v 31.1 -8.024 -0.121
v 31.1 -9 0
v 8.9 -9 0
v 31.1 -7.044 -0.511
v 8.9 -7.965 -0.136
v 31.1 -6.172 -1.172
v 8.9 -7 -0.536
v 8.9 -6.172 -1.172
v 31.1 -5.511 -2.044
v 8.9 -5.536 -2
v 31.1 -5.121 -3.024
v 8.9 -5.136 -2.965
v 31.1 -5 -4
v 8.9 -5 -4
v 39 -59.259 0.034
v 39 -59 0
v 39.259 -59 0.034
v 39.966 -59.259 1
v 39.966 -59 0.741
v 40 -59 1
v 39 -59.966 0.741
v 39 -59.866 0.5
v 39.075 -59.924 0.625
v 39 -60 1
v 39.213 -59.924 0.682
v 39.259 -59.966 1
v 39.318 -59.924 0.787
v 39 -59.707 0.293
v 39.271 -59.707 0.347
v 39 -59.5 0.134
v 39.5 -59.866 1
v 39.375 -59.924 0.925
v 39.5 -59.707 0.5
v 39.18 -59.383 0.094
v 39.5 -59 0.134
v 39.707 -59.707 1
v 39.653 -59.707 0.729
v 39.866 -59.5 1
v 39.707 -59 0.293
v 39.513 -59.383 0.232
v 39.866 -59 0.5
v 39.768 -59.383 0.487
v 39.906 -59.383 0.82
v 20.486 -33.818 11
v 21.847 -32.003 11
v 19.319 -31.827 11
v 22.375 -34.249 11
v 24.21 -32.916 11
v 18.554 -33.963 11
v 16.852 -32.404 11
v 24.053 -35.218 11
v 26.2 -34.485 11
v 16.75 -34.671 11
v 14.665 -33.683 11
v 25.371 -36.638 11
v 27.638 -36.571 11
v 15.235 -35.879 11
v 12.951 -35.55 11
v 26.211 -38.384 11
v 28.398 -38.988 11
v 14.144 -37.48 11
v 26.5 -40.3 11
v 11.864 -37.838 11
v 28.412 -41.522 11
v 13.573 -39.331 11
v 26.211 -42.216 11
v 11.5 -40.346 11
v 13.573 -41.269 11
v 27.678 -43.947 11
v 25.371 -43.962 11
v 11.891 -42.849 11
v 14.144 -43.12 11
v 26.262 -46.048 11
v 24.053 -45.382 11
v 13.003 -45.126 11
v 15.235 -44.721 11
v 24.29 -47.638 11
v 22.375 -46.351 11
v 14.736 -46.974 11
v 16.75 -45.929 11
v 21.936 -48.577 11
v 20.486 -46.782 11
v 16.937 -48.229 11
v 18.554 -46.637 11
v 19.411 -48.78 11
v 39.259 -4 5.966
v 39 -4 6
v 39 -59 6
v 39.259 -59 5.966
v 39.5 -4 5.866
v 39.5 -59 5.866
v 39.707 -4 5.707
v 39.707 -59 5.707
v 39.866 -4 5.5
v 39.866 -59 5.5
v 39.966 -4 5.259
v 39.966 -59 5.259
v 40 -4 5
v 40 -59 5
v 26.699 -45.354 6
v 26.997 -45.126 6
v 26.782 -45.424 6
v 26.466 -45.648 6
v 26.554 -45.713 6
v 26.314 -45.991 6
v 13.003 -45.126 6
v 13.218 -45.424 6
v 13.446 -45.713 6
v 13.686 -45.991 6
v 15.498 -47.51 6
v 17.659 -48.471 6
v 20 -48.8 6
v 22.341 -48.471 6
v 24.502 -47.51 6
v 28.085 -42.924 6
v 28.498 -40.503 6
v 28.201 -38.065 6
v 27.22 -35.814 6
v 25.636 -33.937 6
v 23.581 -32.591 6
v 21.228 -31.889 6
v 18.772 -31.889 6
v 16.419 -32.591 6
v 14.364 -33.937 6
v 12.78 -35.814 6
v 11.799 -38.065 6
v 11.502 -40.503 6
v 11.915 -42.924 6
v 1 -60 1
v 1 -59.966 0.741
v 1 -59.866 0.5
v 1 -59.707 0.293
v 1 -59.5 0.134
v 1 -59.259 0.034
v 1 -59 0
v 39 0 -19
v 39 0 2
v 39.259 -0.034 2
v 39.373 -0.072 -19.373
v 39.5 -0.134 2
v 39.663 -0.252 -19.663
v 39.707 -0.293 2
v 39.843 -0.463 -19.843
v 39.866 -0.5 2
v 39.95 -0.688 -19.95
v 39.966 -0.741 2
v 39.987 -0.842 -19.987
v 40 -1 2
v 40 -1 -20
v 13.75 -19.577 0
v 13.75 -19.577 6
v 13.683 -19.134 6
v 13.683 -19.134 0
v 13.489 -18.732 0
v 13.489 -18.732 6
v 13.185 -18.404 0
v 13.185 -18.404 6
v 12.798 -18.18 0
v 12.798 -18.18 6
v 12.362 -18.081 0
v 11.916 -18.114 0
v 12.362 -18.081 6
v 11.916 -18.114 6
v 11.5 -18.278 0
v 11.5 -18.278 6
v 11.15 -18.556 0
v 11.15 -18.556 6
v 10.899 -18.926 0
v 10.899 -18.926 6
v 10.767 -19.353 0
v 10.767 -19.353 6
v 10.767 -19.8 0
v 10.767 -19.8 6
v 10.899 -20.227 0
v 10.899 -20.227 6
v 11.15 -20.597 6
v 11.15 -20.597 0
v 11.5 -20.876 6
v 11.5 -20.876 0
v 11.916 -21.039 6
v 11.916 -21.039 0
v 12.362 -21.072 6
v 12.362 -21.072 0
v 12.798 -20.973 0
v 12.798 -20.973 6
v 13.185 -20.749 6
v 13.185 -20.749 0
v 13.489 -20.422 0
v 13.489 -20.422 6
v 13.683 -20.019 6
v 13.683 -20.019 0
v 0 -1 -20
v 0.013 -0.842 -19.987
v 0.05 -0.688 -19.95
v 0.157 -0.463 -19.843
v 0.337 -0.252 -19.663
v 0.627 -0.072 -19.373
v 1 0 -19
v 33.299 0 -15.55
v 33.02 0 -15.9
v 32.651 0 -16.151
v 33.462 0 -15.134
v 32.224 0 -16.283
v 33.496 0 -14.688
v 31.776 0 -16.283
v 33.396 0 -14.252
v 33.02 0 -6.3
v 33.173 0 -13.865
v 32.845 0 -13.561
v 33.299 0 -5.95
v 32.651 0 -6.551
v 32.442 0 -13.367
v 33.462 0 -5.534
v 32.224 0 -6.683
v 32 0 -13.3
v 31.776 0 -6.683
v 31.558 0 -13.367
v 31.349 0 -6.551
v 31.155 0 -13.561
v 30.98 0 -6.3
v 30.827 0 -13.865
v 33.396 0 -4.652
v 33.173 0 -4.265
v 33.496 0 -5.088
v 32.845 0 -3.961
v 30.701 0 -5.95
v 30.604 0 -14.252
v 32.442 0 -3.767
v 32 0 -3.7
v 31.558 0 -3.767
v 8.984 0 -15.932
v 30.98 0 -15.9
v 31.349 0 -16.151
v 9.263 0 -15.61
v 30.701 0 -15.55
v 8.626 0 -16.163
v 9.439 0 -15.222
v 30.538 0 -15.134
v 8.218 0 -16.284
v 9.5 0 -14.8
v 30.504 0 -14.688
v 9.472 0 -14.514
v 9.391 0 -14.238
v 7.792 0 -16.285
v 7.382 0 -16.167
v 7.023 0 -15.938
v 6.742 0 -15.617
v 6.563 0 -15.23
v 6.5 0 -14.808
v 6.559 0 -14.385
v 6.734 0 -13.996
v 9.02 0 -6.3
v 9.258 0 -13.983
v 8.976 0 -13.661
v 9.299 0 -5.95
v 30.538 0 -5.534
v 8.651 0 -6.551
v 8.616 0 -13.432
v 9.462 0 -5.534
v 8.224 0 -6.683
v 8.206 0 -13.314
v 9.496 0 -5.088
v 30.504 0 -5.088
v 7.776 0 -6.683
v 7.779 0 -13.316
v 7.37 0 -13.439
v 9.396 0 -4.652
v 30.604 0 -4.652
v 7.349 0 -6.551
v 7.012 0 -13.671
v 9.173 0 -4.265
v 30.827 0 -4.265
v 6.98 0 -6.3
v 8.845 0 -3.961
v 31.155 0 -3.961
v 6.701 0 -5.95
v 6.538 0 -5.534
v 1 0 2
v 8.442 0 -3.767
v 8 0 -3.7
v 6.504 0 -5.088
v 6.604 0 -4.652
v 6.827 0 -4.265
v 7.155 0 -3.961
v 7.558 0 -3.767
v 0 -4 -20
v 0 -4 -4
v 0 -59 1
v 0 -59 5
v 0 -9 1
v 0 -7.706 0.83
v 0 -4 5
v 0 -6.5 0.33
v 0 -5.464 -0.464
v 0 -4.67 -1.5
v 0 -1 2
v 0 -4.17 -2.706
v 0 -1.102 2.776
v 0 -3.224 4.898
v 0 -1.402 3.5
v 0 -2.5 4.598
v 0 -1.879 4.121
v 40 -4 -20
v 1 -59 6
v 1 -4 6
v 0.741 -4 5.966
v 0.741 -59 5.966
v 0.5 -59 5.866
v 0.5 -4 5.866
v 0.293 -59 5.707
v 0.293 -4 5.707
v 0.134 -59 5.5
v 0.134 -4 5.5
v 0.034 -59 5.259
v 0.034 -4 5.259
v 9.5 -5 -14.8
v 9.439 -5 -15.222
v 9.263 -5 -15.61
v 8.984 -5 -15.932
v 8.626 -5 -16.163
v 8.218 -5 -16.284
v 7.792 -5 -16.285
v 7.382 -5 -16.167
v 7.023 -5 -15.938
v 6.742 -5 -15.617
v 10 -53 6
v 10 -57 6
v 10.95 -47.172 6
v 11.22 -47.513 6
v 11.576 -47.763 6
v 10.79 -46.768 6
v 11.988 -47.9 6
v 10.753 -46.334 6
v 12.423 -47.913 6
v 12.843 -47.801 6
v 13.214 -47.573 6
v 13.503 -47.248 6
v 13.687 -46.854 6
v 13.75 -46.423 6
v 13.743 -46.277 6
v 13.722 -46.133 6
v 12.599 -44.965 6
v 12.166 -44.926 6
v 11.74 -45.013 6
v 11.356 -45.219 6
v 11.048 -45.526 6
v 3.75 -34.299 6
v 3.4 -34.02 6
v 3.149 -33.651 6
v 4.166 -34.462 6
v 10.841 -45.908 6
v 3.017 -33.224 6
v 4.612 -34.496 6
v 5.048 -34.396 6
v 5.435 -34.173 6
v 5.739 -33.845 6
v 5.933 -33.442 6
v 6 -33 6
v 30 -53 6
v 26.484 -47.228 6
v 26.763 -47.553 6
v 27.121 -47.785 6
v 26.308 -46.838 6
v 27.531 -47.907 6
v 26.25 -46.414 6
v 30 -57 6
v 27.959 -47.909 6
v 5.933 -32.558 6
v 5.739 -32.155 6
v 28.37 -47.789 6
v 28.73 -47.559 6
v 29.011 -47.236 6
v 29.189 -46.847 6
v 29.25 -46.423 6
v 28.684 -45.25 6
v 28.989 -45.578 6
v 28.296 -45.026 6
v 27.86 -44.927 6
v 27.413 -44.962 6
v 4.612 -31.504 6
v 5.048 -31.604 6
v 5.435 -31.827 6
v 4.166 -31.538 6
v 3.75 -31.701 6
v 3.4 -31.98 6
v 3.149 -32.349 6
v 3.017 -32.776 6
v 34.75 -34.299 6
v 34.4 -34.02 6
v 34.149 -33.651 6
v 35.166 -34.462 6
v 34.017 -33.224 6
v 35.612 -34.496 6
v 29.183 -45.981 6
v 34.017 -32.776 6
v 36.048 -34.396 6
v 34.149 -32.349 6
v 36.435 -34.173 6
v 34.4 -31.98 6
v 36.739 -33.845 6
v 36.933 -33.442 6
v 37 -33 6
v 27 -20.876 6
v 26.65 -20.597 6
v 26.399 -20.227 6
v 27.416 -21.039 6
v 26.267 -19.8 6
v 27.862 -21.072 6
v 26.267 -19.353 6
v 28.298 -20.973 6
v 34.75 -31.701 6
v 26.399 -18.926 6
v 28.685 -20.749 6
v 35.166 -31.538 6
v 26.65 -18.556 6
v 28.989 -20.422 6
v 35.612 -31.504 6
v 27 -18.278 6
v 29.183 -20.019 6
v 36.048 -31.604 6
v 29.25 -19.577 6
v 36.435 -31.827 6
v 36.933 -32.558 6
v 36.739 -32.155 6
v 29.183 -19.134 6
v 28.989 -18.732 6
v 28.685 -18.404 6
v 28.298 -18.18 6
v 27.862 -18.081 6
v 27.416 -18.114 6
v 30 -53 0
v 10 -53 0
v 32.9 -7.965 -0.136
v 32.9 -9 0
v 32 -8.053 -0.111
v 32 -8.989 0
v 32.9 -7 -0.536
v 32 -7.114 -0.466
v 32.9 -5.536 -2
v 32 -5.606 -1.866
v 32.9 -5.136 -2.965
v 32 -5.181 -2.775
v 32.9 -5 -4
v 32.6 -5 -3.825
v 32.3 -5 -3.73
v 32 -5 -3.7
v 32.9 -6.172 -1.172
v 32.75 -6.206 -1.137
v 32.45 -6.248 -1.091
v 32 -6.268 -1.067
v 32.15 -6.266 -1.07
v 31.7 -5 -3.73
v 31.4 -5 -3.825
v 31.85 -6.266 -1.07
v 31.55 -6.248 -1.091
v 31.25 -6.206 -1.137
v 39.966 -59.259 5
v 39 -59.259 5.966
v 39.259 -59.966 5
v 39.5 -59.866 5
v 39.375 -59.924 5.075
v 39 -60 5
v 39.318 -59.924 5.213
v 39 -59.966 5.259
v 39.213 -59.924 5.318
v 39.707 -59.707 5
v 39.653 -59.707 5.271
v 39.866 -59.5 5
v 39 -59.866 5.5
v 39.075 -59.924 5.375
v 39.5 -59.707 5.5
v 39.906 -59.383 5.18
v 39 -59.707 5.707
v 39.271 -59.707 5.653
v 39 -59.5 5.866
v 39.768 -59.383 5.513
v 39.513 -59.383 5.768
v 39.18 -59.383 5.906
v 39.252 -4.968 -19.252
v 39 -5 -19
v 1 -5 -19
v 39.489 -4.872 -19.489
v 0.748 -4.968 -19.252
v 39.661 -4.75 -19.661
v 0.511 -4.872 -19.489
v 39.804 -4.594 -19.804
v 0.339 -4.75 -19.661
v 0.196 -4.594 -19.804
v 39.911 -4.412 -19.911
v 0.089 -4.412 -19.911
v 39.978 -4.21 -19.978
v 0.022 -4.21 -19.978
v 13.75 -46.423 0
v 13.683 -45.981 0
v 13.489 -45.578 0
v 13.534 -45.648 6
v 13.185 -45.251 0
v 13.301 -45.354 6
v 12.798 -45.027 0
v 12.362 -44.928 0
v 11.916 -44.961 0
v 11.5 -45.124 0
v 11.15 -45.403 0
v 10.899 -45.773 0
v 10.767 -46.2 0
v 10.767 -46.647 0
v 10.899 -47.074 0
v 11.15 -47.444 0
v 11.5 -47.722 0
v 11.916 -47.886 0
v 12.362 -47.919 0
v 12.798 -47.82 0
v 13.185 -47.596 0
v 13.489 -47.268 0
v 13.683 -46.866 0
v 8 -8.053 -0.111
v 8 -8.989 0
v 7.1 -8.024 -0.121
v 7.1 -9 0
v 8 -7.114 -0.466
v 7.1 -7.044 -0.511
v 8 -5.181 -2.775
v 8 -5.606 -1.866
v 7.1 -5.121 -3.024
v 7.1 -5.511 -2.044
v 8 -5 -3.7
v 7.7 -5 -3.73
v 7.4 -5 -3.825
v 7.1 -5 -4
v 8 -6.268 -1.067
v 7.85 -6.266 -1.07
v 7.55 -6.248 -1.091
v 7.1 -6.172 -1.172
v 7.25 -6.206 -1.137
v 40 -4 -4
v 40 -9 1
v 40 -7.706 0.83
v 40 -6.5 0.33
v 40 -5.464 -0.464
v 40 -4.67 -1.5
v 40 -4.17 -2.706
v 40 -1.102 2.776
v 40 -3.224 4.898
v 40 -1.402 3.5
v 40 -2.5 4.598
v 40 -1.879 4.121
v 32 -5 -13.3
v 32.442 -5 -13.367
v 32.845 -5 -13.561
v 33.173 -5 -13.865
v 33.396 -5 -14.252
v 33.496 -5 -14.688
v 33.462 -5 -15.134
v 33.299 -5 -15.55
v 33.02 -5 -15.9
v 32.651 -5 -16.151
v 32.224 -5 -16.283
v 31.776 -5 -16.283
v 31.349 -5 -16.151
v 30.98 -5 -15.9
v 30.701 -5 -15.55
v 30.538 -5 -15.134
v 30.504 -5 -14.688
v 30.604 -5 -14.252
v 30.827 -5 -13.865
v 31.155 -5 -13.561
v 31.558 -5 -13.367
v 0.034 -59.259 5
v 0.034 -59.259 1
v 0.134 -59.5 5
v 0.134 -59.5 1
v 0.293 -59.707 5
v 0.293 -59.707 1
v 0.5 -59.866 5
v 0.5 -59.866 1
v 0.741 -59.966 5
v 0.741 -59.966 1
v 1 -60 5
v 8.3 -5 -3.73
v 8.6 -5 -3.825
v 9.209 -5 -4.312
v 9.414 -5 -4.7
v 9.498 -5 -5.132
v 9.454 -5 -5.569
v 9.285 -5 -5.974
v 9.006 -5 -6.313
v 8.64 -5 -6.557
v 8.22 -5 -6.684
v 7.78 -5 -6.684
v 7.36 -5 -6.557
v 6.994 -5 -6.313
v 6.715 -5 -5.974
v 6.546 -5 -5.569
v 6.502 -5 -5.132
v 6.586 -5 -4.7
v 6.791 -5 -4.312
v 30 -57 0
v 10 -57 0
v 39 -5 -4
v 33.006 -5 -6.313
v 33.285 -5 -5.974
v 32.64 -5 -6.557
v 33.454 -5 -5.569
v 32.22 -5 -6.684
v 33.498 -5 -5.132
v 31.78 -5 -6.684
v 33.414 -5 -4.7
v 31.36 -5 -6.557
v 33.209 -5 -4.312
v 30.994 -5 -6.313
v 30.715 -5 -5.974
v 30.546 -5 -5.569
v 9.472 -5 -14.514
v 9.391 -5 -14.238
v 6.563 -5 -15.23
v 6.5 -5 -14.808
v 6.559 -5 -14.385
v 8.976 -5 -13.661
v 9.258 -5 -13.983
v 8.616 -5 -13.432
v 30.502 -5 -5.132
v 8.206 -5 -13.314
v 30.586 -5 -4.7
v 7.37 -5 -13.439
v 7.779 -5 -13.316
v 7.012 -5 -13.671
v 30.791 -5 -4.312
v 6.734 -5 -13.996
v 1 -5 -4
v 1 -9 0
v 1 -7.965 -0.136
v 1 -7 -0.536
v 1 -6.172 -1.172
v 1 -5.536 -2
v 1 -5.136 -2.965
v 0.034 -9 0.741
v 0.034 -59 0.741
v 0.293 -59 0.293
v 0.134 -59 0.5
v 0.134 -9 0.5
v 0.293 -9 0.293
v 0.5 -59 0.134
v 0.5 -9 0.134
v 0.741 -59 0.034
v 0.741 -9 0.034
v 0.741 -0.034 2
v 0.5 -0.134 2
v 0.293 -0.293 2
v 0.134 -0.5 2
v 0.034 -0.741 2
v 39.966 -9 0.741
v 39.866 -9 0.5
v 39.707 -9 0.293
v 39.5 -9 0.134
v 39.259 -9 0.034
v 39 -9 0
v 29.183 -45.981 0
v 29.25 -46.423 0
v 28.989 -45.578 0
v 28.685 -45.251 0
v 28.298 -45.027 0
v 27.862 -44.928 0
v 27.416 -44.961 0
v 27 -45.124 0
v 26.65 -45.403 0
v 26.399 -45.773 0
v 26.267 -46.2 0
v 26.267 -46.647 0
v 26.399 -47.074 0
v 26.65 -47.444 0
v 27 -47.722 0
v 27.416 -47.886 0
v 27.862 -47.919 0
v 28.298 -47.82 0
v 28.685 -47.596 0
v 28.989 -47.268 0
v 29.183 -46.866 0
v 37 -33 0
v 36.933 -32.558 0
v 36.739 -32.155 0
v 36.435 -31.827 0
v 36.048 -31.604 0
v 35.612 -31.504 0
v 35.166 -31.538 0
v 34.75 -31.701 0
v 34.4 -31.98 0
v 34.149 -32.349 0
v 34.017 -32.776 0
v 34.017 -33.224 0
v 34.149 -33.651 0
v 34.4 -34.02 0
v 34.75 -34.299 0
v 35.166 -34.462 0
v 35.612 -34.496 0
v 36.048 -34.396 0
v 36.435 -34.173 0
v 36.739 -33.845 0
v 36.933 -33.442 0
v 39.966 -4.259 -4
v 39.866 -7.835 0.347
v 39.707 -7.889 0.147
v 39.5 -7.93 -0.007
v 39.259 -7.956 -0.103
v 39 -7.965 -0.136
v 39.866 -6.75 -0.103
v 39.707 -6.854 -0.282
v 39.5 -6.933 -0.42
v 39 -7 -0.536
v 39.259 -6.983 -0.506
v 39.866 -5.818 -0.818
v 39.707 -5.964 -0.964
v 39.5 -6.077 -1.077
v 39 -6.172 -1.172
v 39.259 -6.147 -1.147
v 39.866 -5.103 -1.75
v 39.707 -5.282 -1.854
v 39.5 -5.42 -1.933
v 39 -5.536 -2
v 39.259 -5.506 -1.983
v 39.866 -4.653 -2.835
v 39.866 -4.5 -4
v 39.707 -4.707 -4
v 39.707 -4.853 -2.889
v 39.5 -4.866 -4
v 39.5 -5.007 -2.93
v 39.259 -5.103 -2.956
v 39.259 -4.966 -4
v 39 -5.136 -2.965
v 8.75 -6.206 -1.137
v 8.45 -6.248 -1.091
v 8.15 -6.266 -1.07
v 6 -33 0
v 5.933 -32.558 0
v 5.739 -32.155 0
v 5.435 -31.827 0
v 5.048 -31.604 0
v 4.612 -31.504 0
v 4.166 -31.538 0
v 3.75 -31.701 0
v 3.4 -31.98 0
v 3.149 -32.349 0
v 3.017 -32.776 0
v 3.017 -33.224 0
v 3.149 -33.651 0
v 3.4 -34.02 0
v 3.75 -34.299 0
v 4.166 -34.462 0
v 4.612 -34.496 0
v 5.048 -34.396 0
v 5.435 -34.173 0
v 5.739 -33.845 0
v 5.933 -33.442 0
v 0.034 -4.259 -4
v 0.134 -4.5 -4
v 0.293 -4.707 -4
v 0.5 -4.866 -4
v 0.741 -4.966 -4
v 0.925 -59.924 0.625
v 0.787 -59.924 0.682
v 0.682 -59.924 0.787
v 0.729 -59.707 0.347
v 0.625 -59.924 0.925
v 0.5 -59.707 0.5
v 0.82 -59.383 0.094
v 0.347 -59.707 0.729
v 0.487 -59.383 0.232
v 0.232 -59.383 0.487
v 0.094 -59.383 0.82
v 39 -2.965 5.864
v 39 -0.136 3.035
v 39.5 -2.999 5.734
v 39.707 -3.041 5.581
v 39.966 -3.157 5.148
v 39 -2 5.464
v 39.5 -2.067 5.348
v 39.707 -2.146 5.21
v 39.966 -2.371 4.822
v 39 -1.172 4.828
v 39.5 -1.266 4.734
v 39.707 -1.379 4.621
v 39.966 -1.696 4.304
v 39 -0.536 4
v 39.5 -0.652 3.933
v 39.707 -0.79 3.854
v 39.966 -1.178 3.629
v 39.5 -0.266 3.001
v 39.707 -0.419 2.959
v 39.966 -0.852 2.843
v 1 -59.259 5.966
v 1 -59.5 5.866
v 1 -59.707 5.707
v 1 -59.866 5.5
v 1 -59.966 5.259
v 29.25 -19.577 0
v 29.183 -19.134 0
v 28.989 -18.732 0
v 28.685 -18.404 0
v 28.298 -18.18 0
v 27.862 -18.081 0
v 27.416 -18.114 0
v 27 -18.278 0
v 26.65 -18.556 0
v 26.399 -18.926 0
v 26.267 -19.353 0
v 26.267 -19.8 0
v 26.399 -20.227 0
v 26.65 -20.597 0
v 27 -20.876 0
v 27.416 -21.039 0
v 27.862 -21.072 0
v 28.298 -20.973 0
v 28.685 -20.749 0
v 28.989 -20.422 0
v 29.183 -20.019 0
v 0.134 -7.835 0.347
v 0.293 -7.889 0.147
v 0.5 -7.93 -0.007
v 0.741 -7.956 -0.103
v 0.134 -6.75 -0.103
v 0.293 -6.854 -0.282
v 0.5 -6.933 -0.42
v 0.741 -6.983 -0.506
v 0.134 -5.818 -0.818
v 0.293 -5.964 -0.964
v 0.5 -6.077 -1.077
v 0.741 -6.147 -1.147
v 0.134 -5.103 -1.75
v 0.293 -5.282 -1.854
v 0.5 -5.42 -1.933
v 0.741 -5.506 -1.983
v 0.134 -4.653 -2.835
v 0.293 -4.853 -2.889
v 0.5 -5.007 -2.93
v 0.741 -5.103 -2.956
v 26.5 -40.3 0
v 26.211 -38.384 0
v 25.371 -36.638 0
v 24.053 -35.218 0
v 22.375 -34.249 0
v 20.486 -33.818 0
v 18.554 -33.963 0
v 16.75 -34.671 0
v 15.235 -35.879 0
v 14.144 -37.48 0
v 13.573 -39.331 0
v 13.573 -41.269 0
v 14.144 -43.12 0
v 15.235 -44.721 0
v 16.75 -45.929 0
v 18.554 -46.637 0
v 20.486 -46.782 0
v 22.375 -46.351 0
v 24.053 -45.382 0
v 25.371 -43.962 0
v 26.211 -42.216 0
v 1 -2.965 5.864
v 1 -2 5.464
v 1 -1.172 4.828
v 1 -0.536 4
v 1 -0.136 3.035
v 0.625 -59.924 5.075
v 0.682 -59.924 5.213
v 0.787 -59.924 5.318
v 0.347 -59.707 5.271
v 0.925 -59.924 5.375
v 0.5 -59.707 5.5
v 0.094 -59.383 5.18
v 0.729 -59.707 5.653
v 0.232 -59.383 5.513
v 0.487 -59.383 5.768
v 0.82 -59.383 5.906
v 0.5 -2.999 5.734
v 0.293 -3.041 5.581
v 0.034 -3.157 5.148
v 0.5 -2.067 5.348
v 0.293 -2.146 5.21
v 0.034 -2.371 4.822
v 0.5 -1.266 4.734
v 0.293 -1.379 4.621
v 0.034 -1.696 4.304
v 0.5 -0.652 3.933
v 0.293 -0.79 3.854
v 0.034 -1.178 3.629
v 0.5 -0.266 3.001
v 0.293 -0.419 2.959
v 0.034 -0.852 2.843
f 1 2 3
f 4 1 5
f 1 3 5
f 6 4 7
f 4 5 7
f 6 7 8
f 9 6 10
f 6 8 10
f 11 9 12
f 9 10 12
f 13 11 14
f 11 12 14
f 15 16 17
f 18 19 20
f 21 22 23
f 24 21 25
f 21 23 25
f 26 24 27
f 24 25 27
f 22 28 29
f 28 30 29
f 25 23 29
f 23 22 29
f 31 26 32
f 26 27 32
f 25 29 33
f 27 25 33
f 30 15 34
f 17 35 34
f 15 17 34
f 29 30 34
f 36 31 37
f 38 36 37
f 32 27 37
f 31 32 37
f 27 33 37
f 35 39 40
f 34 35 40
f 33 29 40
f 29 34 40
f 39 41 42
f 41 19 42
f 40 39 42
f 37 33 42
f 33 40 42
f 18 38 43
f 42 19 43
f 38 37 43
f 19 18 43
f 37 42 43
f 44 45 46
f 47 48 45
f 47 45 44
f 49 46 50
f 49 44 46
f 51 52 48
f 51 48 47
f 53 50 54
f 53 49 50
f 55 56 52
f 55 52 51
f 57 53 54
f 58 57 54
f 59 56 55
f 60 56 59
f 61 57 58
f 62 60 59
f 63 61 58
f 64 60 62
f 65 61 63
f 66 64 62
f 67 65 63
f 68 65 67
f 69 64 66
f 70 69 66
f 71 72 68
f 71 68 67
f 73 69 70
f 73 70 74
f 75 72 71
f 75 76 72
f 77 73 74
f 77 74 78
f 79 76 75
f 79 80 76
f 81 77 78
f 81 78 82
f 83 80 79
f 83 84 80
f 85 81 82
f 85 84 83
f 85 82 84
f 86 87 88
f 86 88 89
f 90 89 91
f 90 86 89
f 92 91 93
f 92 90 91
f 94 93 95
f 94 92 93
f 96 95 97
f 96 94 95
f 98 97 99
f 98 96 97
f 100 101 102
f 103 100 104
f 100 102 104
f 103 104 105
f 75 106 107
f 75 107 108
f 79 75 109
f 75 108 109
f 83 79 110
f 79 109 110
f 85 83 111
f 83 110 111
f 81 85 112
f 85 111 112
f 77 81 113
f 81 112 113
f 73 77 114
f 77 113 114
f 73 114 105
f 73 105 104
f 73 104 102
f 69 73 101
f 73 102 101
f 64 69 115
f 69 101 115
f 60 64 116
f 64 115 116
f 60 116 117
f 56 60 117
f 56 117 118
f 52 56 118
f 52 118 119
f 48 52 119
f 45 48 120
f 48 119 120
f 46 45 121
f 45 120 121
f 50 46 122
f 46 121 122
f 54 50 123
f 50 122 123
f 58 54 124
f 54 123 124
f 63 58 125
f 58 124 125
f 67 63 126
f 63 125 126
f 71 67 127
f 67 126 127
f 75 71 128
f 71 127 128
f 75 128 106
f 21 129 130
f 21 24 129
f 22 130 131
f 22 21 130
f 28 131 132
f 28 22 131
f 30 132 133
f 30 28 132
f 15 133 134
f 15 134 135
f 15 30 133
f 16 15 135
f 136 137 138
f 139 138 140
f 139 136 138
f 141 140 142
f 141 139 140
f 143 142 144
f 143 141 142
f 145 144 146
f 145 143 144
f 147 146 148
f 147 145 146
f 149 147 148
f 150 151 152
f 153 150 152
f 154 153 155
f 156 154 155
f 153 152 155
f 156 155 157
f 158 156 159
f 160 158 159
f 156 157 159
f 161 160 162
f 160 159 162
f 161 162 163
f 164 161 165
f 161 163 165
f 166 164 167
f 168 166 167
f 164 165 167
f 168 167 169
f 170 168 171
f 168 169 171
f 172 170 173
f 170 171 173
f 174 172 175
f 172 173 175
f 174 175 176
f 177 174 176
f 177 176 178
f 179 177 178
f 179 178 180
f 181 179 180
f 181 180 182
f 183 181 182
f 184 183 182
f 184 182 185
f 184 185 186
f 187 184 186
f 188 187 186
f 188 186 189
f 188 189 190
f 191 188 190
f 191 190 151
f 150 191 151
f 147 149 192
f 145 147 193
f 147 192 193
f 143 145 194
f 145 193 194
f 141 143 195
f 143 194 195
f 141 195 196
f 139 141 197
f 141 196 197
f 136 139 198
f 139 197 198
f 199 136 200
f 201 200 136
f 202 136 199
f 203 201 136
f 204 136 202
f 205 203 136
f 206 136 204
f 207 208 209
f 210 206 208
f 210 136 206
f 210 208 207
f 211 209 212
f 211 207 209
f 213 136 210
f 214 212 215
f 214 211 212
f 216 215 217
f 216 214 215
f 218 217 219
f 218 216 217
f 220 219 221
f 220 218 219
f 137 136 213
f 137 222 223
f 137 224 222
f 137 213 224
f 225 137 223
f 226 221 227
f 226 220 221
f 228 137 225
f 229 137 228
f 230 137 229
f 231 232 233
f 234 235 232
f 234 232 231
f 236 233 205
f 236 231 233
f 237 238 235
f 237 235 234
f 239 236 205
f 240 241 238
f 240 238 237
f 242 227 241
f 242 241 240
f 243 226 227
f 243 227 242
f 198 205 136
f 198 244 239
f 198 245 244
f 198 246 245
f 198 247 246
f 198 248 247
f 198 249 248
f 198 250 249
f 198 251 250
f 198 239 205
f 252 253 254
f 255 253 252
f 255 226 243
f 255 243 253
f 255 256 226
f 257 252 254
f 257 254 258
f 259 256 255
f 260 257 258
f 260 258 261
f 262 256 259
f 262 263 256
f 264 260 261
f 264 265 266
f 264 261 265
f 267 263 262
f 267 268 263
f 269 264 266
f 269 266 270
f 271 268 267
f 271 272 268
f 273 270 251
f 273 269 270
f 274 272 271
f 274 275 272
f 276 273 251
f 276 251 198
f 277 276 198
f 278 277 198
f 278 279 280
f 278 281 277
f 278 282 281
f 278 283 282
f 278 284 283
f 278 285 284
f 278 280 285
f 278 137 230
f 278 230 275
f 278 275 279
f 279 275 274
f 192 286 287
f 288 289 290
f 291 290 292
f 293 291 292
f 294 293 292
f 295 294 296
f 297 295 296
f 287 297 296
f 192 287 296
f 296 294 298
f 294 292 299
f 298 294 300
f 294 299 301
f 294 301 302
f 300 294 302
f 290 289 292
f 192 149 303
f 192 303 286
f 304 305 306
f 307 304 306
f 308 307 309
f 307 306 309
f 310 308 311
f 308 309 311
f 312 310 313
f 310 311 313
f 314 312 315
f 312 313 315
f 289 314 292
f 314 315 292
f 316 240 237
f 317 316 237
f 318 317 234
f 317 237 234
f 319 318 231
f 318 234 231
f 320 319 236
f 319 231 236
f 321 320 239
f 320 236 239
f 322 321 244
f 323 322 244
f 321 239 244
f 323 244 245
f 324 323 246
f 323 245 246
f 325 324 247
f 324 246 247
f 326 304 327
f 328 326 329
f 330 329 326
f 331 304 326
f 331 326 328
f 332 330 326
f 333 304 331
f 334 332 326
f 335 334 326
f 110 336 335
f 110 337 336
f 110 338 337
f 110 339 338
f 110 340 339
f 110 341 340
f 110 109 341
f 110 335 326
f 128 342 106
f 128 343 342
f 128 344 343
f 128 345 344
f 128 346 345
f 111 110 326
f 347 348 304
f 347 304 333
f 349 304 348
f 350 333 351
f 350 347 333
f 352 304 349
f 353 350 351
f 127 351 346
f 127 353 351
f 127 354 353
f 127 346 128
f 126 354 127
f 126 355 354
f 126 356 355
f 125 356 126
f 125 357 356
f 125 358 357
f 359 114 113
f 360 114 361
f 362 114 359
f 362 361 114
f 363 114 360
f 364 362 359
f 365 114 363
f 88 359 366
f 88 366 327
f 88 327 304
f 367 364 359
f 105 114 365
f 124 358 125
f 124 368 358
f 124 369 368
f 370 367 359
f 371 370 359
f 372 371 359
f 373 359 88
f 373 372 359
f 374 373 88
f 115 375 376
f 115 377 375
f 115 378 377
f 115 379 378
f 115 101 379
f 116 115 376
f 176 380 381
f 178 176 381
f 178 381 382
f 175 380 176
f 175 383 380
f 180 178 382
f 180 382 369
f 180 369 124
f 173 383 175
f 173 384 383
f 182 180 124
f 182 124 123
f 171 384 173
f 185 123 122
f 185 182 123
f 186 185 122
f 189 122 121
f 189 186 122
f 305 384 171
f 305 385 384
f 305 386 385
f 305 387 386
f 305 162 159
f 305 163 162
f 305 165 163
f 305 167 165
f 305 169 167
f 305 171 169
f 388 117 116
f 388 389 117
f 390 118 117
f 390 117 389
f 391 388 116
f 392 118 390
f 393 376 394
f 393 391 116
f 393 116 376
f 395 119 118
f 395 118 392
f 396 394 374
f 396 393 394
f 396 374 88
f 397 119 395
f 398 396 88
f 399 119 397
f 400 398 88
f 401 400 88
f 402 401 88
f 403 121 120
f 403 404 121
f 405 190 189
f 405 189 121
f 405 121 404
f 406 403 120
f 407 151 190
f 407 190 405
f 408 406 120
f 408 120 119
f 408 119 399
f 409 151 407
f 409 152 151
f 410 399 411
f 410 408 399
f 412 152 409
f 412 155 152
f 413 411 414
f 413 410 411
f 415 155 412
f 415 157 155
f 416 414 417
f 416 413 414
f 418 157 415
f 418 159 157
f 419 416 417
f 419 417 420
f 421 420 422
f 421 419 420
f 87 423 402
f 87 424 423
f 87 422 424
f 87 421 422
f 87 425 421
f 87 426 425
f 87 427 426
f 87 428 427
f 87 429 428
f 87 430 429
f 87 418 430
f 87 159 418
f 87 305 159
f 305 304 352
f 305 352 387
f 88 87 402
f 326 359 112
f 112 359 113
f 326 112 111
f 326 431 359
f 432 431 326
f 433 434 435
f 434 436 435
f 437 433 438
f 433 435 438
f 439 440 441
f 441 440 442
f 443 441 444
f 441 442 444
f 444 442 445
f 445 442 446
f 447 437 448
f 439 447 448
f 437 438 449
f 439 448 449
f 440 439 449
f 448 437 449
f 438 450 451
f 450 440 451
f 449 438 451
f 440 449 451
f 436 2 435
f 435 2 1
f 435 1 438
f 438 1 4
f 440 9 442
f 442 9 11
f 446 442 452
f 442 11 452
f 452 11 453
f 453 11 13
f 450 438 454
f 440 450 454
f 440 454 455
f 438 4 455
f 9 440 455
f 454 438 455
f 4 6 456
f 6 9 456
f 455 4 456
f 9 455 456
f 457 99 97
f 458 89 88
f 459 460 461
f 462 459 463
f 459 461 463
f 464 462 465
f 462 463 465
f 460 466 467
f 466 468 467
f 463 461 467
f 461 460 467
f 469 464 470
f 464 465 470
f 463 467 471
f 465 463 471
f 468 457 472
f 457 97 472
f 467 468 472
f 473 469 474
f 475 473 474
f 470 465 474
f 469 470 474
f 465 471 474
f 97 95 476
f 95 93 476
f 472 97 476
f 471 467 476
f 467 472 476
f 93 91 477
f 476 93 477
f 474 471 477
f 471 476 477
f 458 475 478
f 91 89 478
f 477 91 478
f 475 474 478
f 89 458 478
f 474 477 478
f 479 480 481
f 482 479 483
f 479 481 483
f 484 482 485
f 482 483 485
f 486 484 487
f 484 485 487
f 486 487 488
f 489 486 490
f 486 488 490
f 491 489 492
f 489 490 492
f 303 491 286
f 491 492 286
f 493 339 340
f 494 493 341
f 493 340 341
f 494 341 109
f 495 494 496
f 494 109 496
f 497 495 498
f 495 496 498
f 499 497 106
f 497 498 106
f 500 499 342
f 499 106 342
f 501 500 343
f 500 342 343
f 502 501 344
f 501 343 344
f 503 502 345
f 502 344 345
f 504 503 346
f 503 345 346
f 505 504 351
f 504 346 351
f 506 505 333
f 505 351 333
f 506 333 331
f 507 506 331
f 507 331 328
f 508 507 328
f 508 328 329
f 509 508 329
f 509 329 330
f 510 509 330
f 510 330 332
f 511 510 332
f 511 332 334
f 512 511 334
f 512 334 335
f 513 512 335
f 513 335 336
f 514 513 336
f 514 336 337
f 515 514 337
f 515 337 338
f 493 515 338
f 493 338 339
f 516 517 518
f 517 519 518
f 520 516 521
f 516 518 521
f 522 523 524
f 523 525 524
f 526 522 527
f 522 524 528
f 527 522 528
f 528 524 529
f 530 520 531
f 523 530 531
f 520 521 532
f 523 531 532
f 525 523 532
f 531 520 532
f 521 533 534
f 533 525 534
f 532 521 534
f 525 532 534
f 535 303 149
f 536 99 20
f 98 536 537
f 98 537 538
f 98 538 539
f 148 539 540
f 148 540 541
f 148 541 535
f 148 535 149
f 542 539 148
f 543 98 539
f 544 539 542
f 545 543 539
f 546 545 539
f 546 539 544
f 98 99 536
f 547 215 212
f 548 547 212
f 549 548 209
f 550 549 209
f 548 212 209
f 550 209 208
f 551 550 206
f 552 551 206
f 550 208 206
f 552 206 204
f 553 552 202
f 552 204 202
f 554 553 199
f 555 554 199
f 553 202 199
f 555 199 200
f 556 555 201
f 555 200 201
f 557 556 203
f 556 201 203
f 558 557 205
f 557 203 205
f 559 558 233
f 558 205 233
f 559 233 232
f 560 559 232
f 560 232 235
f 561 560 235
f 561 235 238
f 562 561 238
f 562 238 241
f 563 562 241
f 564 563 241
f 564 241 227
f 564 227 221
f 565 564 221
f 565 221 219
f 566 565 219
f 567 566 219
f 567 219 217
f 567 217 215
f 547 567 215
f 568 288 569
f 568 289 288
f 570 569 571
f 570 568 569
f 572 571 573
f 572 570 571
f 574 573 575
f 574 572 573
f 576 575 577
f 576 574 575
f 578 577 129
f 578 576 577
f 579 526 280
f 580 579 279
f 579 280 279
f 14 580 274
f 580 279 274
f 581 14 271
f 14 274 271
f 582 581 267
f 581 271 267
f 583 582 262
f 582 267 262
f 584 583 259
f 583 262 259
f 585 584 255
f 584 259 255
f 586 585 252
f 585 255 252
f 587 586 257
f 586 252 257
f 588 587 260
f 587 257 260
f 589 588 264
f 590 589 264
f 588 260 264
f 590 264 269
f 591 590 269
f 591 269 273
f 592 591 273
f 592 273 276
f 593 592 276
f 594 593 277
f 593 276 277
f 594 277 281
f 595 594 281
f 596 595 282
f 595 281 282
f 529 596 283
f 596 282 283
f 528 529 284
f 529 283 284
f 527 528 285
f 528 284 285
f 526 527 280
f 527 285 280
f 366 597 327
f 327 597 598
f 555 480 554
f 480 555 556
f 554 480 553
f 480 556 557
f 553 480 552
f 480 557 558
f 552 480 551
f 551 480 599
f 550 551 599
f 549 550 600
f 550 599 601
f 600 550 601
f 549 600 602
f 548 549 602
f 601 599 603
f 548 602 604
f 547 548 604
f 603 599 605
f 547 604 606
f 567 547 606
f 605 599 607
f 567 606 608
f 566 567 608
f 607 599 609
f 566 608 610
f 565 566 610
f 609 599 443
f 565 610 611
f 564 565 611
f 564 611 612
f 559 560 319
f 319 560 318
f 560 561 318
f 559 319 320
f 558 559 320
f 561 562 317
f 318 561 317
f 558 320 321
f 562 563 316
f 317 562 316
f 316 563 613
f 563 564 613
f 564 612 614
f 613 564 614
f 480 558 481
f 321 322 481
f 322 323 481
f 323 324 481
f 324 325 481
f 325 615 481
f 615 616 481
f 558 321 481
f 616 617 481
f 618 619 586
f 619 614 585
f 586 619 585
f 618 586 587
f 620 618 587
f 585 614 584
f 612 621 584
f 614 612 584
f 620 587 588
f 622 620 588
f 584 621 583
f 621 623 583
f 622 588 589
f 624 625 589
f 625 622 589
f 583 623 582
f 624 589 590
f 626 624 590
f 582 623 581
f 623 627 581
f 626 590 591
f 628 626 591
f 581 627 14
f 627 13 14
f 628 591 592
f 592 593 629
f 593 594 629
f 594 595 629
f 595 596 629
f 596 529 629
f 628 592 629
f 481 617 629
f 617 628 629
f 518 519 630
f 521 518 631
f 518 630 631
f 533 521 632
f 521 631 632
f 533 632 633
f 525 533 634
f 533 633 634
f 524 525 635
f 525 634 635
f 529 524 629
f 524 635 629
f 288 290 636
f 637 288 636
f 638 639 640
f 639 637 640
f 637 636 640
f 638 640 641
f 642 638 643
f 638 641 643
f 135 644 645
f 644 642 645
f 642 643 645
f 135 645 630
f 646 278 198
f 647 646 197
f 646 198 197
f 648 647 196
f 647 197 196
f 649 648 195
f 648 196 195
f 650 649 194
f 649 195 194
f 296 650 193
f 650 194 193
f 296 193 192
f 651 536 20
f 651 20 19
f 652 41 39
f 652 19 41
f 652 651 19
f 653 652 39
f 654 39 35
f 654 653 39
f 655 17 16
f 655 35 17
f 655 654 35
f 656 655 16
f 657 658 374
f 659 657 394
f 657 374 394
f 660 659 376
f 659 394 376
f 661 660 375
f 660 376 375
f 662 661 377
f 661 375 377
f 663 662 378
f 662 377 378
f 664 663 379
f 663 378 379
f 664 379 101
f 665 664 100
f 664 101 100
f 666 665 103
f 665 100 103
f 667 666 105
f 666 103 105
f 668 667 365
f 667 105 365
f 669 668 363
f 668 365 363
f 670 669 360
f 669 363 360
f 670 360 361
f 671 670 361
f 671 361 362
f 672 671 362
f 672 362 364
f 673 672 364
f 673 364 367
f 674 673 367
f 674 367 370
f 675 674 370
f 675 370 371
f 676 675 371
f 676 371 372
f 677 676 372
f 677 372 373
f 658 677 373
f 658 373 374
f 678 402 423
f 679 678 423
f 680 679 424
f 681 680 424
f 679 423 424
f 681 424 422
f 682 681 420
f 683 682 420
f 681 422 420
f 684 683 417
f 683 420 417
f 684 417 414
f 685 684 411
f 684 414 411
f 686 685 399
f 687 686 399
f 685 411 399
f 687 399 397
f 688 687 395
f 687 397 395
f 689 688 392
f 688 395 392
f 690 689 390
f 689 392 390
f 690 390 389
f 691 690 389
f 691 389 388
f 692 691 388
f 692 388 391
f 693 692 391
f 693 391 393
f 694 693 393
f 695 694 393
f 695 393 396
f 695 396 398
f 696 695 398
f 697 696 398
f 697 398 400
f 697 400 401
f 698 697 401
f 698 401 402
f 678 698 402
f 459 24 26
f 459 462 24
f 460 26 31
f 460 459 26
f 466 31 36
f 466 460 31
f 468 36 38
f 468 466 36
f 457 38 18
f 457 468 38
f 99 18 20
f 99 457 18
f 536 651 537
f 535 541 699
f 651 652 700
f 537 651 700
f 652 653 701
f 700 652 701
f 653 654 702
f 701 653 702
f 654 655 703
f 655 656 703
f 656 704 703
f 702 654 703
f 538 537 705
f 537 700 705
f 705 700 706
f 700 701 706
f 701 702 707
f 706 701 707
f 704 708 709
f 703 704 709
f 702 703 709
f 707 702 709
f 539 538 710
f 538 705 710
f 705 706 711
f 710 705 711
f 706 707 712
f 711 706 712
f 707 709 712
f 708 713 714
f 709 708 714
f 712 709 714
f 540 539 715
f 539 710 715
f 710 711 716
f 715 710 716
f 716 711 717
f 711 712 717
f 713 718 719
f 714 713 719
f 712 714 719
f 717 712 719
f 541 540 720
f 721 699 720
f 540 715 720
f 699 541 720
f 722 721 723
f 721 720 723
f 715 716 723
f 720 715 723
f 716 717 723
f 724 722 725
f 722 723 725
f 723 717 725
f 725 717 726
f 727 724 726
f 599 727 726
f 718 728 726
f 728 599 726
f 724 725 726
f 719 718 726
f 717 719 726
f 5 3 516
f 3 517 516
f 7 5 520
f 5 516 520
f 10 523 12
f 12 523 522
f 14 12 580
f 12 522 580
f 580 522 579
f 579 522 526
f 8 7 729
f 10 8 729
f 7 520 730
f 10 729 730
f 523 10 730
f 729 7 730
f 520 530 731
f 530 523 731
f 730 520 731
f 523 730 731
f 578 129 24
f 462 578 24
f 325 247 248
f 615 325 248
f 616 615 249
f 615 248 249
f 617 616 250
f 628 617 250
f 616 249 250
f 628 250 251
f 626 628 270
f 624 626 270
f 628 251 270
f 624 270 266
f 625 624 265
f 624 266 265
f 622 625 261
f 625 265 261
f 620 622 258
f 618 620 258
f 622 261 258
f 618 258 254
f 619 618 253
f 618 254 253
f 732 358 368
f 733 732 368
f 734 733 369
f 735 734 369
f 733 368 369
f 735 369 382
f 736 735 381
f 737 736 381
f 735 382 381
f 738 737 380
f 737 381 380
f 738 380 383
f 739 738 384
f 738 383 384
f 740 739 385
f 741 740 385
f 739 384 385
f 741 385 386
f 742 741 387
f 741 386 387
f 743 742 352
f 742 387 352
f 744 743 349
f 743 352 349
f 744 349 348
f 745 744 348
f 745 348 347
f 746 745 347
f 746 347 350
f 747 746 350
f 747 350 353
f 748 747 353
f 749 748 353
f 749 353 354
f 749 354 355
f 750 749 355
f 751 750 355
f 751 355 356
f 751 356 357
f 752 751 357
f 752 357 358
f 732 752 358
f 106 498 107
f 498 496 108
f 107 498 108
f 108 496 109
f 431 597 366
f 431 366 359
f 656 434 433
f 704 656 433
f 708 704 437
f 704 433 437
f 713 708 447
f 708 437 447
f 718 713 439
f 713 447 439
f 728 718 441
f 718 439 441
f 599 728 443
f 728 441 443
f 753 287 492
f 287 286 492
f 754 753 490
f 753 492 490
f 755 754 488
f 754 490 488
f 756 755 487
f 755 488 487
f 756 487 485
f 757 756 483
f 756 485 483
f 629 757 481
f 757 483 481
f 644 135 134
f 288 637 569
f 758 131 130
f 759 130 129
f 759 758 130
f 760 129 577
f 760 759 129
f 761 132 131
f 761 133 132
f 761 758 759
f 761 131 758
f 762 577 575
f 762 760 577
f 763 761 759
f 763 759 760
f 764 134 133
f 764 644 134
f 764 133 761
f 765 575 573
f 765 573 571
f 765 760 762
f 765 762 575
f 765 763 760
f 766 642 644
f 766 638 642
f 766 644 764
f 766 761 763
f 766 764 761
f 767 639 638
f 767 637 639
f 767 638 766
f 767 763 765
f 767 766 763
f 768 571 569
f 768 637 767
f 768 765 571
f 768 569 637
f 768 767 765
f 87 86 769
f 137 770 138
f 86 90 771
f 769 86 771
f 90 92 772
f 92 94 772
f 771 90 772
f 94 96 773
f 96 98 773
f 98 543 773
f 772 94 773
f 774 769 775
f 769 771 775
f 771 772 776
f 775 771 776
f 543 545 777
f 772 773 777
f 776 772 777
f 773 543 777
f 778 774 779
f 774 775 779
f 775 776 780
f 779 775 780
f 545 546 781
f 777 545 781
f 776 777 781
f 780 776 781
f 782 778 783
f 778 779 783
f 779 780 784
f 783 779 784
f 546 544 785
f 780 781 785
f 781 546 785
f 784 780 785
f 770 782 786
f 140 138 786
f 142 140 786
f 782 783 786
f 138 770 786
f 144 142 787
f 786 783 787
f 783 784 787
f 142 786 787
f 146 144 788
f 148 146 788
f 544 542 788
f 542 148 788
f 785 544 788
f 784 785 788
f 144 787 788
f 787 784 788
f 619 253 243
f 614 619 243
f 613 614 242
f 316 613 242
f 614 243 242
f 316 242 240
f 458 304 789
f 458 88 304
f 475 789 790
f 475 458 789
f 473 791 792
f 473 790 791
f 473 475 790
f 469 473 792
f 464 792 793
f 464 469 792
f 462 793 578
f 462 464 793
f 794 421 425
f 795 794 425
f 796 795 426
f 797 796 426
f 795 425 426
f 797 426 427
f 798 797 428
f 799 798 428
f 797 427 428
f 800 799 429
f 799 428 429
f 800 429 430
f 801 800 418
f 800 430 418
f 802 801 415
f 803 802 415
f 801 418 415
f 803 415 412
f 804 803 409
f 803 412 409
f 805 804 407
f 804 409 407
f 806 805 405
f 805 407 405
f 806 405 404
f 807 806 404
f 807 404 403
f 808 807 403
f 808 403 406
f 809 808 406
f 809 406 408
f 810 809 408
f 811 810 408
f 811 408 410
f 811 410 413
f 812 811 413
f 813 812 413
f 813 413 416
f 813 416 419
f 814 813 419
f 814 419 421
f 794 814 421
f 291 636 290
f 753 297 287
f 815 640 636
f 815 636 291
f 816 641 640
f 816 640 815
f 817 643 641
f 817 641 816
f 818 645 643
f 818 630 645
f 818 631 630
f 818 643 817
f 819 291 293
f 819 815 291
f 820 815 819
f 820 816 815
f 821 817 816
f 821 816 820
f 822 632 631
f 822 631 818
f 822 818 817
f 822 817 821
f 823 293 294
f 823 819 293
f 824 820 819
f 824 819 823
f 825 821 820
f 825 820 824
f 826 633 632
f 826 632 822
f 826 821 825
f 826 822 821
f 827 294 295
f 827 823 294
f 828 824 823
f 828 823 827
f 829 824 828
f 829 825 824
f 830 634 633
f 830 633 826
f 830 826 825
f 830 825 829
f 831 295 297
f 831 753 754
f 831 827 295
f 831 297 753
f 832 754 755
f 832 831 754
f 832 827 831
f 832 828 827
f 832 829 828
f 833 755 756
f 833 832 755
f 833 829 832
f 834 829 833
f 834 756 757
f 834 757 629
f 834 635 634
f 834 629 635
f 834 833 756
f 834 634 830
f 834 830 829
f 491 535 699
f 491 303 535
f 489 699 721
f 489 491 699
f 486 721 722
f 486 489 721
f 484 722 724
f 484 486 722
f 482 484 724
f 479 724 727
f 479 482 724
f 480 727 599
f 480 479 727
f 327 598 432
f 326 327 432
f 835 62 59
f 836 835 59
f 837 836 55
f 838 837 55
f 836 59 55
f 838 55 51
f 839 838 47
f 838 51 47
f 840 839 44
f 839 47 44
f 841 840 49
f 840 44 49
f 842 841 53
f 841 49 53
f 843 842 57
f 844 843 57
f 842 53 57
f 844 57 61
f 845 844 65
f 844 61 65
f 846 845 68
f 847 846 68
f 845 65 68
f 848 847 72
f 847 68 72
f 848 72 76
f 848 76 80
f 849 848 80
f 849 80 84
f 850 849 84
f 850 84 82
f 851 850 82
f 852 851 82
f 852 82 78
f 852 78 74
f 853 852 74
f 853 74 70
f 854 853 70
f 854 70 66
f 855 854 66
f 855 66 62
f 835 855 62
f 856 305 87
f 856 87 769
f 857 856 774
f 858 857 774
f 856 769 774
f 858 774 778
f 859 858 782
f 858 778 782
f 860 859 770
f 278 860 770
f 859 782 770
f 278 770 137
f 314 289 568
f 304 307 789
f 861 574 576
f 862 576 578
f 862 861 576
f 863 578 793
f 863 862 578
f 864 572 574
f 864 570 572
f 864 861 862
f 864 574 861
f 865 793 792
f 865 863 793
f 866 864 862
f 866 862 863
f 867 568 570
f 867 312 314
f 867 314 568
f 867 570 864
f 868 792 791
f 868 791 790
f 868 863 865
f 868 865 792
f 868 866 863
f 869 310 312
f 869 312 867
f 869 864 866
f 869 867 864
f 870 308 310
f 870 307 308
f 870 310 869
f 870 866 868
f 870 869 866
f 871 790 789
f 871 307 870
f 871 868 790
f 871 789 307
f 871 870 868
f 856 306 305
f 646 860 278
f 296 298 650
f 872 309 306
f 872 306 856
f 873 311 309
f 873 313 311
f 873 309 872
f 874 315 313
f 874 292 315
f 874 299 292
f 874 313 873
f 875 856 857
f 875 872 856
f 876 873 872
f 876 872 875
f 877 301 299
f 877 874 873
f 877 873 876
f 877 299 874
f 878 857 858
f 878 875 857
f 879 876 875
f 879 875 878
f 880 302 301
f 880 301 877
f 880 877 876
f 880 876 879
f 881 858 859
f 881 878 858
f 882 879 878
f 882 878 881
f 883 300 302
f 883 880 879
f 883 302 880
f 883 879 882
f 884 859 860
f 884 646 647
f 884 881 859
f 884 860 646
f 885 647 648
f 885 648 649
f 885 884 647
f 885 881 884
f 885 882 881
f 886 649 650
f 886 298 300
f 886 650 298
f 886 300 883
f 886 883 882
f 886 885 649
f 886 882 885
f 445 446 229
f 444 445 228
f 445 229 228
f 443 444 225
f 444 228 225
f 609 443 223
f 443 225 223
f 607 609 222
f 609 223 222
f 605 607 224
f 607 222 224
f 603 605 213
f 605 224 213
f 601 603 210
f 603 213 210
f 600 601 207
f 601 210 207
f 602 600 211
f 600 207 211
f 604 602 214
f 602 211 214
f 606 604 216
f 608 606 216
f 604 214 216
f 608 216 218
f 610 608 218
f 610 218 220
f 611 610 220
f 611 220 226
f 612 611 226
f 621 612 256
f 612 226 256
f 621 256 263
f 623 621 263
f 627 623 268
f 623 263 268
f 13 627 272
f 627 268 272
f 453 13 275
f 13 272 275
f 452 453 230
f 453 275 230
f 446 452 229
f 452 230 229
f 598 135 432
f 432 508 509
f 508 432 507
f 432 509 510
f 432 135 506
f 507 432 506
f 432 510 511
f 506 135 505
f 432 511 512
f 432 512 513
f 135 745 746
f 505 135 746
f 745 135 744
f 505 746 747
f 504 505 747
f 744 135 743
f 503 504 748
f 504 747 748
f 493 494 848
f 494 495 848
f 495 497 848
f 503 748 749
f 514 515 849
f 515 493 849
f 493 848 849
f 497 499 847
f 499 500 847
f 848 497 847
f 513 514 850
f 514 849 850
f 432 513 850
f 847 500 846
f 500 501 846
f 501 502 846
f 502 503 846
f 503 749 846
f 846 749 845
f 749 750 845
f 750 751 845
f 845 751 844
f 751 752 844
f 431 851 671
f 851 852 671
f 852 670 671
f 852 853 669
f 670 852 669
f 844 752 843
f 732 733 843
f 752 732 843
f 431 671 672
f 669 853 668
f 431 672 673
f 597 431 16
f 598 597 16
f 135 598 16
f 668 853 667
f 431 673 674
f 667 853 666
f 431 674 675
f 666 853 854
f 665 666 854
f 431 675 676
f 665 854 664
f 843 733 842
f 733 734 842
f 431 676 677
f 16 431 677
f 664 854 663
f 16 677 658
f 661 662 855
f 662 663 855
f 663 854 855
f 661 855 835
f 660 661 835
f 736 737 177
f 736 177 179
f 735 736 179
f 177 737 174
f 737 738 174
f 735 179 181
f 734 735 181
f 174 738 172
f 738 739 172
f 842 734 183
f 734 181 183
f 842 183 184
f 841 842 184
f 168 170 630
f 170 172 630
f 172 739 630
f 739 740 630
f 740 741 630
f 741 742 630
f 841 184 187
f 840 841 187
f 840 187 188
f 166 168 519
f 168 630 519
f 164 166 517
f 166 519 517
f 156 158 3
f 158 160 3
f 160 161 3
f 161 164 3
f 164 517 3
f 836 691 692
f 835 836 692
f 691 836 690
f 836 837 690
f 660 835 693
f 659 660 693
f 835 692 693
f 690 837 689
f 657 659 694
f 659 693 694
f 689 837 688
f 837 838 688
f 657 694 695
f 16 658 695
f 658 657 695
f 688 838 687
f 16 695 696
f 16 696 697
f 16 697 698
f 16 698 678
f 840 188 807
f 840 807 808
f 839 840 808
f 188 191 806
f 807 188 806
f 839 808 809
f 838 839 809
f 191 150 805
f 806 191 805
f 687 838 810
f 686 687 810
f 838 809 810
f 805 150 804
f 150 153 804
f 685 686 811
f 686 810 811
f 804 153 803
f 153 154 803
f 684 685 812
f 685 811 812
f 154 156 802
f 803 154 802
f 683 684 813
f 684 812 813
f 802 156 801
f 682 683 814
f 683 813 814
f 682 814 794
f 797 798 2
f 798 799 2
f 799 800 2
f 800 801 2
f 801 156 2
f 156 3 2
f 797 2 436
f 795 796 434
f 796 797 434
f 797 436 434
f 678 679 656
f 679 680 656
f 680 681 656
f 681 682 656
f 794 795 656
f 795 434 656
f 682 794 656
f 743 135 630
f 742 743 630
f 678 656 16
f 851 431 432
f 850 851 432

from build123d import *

# Parameters (mm, degrees)
SKETCH_1_W          = 40
SKETCH_1_H          = 60
EXTRUDE_1_DEPTH     = 6
SKETCH_2_W          = 40
SKETCH_2_H          = 5
EXTRUDE_2_DEPTH     = 20
SKETCH_3_R          = 1.5
CUT_EXTRUDE_1_DEPTH = 20
SKETCH_5_R          = 8.5
EXTRUDE_3_DEPTH     = 5
SKETCH_7_R          = 6.5
CUT_EXTRUDE_3_DEPTH = 27
SKETCH_8_R          = 1.5
CUT_EXTRUDE_5_DEPTH = 27
SKETCH_9_W          = 20
SKETCH_9_H          = 4
CUT_EXTRUDE_6_DEPTH = 27
FILLET_1_R          = 4
FILLET_2_R          = 1


with BuildPart() as part:
    # 草图1 → 凸台-拉伸1 (new body)
    with BuildSketch(Plane.XY):
        with Locations((20, -30)):
            Rectangle(SKETCH_1_W, SKETCH_1_H)
    extrude(amount=EXTRUDE_1_DEPTH)

    # 草图2 → 凸台-拉伸2 (add)
    with BuildSketch(Plane(origin=(0, 0, 0), x_dir=(-1, 0, 0), z_dir=(0, 0, -1))):
        with Locations((-20, -2.5)):
            Rectangle(SKETCH_2_W, SKETCH_2_H)
    extrude(amount=EXTRUDE_2_DEPTH)

    # 草图3 → 切除-拉伸1 (cut)
    with BuildSketch(Plane.XY.offset(6)):
        with Locations((35.5, -33)):
            Circle(SKETCH_3_R)
        with Locations((27.75, -46.423393759)):
            Circle(SKETCH_3_R)
        with Locations((12.25, -46.423393759)):
            Circle(SKETCH_3_R)
        with Locations((4.5, -33)):
            Circle(SKETCH_3_R)
        with Locations((12.25, -19.576606241)):
            Circle(SKETCH_3_R)
        with Locations((27.75, -19.576606241)):
            Circle(SKETCH_3_R)
    extrude(amount=-CUT_EXTRUDE_1_DEPTH, mode=Mode.SUBTRACT)

    # 草图5 → 凸台-拉伸3 (add)
    with BuildSketch(Plane.XY.offset(6)):
        with Locations(Location((20, -40.3, 0), (0, 0, 214.594788024))):
            Circle(SKETCH_5_R)
    extrude(amount=EXTRUDE_3_DEPTH)

    # 草图7 → 切除-拉伸3 (cut)
    with BuildSketch(Plane.XY.offset(11)):
        with Locations((20, -40.3)):
            Circle(SKETCH_7_R)
    extrude(amount=-CUT_EXTRUDE_3_DEPTH, mode=Mode.SUBTRACT)

    # 草图8 → 切除-拉伸5 (cut)
    with BuildSketch(Plane(origin=(0, 0, 0), x_dir=(1, 0, 0), z_dir=(0, 1, 0))):
        with BuildLine():
            ThreePointArc((9.5, 14.8), (8.426322568, 16.238140837), (6.742334576, 15.617482526))
            Line((6.742334576, 15.617482526), (9.257665424, 13.982517474))
            ThreePointArc((9.257665424, 13.982517474), (9.438140837, 14.373677432), (9.5, 14.8))
        make_face()
        with BuildLine():
            Line((9.257665424, 13.982517474), (6.742334576, 15.617482526))
            ThreePointArc((6.742334576, 15.617482526), (7.182517474, 13.542334576), (9.257665424, 13.982517474))
        make_face()
        with Locations(Location((8, 5.2, 0), (0, 0, 270))):
            Circle(SKETCH_8_R)
        with Locations(Location((32, 14.8, 0), (0, 0, 270))):
            Circle(SKETCH_8_R)
        with Locations(Location((32, 5.2, 0), (0, 0, 270))):
            Circle(SKETCH_8_R)
    extrude(amount=-CUT_EXTRUDE_5_DEPTH, mode=Mode.SUBTRACT)

    # 草图9 → 切除-拉伸6 (cut)
    with BuildSketch(Plane(origin=(0, 0, 0), x_dir=(-1, 0, 0), z_dir=(0, 0, -1))):
        with Locations((-20, -55)):
            Rectangle(SKETCH_9_W, SKETCH_9_H)
    extrude(amount=-CUT_EXTRUDE_6_DEPTH, mode=Mode.SUBTRACT)

    # 圆角1
    fillet_1_edges = [part.edges().sort_by_distance(p)[0] for p in [
        (20, -5, 0),
        (20, 0, 6),
    ]]
    fillet(fillet_1_edges, radius=FILLET_1_R)

    # 圆角2
    fillet_2_edges = [part.edges().sort_by_distance(p)[0] for p in [
        (0, -34.5, 0),
        (0, -32, 6),
        (0, 0, -9),
        (0, -1.171572875, 4.828427125),
        (40, -32, 6),
        (40, 0, -9),
        (40, -1.171572875, 4.828427125),
        (0, -6.171572875, -1.171572875),
        (40, -6.171572875, -1.171572875),
        (40, -5, -12),
        (0, -5, -12),
        (20, -5, -20),
        (20, 0, -20),
        (40, -34.5, 0),
        (20, -60, 0),
        (40, -60, 3),
        (0, -60, 3),
        (20, -60, 6),
    ]]
    fillet(fillet_2_edges, radius=FILLET_2_R)


solid = part.part
